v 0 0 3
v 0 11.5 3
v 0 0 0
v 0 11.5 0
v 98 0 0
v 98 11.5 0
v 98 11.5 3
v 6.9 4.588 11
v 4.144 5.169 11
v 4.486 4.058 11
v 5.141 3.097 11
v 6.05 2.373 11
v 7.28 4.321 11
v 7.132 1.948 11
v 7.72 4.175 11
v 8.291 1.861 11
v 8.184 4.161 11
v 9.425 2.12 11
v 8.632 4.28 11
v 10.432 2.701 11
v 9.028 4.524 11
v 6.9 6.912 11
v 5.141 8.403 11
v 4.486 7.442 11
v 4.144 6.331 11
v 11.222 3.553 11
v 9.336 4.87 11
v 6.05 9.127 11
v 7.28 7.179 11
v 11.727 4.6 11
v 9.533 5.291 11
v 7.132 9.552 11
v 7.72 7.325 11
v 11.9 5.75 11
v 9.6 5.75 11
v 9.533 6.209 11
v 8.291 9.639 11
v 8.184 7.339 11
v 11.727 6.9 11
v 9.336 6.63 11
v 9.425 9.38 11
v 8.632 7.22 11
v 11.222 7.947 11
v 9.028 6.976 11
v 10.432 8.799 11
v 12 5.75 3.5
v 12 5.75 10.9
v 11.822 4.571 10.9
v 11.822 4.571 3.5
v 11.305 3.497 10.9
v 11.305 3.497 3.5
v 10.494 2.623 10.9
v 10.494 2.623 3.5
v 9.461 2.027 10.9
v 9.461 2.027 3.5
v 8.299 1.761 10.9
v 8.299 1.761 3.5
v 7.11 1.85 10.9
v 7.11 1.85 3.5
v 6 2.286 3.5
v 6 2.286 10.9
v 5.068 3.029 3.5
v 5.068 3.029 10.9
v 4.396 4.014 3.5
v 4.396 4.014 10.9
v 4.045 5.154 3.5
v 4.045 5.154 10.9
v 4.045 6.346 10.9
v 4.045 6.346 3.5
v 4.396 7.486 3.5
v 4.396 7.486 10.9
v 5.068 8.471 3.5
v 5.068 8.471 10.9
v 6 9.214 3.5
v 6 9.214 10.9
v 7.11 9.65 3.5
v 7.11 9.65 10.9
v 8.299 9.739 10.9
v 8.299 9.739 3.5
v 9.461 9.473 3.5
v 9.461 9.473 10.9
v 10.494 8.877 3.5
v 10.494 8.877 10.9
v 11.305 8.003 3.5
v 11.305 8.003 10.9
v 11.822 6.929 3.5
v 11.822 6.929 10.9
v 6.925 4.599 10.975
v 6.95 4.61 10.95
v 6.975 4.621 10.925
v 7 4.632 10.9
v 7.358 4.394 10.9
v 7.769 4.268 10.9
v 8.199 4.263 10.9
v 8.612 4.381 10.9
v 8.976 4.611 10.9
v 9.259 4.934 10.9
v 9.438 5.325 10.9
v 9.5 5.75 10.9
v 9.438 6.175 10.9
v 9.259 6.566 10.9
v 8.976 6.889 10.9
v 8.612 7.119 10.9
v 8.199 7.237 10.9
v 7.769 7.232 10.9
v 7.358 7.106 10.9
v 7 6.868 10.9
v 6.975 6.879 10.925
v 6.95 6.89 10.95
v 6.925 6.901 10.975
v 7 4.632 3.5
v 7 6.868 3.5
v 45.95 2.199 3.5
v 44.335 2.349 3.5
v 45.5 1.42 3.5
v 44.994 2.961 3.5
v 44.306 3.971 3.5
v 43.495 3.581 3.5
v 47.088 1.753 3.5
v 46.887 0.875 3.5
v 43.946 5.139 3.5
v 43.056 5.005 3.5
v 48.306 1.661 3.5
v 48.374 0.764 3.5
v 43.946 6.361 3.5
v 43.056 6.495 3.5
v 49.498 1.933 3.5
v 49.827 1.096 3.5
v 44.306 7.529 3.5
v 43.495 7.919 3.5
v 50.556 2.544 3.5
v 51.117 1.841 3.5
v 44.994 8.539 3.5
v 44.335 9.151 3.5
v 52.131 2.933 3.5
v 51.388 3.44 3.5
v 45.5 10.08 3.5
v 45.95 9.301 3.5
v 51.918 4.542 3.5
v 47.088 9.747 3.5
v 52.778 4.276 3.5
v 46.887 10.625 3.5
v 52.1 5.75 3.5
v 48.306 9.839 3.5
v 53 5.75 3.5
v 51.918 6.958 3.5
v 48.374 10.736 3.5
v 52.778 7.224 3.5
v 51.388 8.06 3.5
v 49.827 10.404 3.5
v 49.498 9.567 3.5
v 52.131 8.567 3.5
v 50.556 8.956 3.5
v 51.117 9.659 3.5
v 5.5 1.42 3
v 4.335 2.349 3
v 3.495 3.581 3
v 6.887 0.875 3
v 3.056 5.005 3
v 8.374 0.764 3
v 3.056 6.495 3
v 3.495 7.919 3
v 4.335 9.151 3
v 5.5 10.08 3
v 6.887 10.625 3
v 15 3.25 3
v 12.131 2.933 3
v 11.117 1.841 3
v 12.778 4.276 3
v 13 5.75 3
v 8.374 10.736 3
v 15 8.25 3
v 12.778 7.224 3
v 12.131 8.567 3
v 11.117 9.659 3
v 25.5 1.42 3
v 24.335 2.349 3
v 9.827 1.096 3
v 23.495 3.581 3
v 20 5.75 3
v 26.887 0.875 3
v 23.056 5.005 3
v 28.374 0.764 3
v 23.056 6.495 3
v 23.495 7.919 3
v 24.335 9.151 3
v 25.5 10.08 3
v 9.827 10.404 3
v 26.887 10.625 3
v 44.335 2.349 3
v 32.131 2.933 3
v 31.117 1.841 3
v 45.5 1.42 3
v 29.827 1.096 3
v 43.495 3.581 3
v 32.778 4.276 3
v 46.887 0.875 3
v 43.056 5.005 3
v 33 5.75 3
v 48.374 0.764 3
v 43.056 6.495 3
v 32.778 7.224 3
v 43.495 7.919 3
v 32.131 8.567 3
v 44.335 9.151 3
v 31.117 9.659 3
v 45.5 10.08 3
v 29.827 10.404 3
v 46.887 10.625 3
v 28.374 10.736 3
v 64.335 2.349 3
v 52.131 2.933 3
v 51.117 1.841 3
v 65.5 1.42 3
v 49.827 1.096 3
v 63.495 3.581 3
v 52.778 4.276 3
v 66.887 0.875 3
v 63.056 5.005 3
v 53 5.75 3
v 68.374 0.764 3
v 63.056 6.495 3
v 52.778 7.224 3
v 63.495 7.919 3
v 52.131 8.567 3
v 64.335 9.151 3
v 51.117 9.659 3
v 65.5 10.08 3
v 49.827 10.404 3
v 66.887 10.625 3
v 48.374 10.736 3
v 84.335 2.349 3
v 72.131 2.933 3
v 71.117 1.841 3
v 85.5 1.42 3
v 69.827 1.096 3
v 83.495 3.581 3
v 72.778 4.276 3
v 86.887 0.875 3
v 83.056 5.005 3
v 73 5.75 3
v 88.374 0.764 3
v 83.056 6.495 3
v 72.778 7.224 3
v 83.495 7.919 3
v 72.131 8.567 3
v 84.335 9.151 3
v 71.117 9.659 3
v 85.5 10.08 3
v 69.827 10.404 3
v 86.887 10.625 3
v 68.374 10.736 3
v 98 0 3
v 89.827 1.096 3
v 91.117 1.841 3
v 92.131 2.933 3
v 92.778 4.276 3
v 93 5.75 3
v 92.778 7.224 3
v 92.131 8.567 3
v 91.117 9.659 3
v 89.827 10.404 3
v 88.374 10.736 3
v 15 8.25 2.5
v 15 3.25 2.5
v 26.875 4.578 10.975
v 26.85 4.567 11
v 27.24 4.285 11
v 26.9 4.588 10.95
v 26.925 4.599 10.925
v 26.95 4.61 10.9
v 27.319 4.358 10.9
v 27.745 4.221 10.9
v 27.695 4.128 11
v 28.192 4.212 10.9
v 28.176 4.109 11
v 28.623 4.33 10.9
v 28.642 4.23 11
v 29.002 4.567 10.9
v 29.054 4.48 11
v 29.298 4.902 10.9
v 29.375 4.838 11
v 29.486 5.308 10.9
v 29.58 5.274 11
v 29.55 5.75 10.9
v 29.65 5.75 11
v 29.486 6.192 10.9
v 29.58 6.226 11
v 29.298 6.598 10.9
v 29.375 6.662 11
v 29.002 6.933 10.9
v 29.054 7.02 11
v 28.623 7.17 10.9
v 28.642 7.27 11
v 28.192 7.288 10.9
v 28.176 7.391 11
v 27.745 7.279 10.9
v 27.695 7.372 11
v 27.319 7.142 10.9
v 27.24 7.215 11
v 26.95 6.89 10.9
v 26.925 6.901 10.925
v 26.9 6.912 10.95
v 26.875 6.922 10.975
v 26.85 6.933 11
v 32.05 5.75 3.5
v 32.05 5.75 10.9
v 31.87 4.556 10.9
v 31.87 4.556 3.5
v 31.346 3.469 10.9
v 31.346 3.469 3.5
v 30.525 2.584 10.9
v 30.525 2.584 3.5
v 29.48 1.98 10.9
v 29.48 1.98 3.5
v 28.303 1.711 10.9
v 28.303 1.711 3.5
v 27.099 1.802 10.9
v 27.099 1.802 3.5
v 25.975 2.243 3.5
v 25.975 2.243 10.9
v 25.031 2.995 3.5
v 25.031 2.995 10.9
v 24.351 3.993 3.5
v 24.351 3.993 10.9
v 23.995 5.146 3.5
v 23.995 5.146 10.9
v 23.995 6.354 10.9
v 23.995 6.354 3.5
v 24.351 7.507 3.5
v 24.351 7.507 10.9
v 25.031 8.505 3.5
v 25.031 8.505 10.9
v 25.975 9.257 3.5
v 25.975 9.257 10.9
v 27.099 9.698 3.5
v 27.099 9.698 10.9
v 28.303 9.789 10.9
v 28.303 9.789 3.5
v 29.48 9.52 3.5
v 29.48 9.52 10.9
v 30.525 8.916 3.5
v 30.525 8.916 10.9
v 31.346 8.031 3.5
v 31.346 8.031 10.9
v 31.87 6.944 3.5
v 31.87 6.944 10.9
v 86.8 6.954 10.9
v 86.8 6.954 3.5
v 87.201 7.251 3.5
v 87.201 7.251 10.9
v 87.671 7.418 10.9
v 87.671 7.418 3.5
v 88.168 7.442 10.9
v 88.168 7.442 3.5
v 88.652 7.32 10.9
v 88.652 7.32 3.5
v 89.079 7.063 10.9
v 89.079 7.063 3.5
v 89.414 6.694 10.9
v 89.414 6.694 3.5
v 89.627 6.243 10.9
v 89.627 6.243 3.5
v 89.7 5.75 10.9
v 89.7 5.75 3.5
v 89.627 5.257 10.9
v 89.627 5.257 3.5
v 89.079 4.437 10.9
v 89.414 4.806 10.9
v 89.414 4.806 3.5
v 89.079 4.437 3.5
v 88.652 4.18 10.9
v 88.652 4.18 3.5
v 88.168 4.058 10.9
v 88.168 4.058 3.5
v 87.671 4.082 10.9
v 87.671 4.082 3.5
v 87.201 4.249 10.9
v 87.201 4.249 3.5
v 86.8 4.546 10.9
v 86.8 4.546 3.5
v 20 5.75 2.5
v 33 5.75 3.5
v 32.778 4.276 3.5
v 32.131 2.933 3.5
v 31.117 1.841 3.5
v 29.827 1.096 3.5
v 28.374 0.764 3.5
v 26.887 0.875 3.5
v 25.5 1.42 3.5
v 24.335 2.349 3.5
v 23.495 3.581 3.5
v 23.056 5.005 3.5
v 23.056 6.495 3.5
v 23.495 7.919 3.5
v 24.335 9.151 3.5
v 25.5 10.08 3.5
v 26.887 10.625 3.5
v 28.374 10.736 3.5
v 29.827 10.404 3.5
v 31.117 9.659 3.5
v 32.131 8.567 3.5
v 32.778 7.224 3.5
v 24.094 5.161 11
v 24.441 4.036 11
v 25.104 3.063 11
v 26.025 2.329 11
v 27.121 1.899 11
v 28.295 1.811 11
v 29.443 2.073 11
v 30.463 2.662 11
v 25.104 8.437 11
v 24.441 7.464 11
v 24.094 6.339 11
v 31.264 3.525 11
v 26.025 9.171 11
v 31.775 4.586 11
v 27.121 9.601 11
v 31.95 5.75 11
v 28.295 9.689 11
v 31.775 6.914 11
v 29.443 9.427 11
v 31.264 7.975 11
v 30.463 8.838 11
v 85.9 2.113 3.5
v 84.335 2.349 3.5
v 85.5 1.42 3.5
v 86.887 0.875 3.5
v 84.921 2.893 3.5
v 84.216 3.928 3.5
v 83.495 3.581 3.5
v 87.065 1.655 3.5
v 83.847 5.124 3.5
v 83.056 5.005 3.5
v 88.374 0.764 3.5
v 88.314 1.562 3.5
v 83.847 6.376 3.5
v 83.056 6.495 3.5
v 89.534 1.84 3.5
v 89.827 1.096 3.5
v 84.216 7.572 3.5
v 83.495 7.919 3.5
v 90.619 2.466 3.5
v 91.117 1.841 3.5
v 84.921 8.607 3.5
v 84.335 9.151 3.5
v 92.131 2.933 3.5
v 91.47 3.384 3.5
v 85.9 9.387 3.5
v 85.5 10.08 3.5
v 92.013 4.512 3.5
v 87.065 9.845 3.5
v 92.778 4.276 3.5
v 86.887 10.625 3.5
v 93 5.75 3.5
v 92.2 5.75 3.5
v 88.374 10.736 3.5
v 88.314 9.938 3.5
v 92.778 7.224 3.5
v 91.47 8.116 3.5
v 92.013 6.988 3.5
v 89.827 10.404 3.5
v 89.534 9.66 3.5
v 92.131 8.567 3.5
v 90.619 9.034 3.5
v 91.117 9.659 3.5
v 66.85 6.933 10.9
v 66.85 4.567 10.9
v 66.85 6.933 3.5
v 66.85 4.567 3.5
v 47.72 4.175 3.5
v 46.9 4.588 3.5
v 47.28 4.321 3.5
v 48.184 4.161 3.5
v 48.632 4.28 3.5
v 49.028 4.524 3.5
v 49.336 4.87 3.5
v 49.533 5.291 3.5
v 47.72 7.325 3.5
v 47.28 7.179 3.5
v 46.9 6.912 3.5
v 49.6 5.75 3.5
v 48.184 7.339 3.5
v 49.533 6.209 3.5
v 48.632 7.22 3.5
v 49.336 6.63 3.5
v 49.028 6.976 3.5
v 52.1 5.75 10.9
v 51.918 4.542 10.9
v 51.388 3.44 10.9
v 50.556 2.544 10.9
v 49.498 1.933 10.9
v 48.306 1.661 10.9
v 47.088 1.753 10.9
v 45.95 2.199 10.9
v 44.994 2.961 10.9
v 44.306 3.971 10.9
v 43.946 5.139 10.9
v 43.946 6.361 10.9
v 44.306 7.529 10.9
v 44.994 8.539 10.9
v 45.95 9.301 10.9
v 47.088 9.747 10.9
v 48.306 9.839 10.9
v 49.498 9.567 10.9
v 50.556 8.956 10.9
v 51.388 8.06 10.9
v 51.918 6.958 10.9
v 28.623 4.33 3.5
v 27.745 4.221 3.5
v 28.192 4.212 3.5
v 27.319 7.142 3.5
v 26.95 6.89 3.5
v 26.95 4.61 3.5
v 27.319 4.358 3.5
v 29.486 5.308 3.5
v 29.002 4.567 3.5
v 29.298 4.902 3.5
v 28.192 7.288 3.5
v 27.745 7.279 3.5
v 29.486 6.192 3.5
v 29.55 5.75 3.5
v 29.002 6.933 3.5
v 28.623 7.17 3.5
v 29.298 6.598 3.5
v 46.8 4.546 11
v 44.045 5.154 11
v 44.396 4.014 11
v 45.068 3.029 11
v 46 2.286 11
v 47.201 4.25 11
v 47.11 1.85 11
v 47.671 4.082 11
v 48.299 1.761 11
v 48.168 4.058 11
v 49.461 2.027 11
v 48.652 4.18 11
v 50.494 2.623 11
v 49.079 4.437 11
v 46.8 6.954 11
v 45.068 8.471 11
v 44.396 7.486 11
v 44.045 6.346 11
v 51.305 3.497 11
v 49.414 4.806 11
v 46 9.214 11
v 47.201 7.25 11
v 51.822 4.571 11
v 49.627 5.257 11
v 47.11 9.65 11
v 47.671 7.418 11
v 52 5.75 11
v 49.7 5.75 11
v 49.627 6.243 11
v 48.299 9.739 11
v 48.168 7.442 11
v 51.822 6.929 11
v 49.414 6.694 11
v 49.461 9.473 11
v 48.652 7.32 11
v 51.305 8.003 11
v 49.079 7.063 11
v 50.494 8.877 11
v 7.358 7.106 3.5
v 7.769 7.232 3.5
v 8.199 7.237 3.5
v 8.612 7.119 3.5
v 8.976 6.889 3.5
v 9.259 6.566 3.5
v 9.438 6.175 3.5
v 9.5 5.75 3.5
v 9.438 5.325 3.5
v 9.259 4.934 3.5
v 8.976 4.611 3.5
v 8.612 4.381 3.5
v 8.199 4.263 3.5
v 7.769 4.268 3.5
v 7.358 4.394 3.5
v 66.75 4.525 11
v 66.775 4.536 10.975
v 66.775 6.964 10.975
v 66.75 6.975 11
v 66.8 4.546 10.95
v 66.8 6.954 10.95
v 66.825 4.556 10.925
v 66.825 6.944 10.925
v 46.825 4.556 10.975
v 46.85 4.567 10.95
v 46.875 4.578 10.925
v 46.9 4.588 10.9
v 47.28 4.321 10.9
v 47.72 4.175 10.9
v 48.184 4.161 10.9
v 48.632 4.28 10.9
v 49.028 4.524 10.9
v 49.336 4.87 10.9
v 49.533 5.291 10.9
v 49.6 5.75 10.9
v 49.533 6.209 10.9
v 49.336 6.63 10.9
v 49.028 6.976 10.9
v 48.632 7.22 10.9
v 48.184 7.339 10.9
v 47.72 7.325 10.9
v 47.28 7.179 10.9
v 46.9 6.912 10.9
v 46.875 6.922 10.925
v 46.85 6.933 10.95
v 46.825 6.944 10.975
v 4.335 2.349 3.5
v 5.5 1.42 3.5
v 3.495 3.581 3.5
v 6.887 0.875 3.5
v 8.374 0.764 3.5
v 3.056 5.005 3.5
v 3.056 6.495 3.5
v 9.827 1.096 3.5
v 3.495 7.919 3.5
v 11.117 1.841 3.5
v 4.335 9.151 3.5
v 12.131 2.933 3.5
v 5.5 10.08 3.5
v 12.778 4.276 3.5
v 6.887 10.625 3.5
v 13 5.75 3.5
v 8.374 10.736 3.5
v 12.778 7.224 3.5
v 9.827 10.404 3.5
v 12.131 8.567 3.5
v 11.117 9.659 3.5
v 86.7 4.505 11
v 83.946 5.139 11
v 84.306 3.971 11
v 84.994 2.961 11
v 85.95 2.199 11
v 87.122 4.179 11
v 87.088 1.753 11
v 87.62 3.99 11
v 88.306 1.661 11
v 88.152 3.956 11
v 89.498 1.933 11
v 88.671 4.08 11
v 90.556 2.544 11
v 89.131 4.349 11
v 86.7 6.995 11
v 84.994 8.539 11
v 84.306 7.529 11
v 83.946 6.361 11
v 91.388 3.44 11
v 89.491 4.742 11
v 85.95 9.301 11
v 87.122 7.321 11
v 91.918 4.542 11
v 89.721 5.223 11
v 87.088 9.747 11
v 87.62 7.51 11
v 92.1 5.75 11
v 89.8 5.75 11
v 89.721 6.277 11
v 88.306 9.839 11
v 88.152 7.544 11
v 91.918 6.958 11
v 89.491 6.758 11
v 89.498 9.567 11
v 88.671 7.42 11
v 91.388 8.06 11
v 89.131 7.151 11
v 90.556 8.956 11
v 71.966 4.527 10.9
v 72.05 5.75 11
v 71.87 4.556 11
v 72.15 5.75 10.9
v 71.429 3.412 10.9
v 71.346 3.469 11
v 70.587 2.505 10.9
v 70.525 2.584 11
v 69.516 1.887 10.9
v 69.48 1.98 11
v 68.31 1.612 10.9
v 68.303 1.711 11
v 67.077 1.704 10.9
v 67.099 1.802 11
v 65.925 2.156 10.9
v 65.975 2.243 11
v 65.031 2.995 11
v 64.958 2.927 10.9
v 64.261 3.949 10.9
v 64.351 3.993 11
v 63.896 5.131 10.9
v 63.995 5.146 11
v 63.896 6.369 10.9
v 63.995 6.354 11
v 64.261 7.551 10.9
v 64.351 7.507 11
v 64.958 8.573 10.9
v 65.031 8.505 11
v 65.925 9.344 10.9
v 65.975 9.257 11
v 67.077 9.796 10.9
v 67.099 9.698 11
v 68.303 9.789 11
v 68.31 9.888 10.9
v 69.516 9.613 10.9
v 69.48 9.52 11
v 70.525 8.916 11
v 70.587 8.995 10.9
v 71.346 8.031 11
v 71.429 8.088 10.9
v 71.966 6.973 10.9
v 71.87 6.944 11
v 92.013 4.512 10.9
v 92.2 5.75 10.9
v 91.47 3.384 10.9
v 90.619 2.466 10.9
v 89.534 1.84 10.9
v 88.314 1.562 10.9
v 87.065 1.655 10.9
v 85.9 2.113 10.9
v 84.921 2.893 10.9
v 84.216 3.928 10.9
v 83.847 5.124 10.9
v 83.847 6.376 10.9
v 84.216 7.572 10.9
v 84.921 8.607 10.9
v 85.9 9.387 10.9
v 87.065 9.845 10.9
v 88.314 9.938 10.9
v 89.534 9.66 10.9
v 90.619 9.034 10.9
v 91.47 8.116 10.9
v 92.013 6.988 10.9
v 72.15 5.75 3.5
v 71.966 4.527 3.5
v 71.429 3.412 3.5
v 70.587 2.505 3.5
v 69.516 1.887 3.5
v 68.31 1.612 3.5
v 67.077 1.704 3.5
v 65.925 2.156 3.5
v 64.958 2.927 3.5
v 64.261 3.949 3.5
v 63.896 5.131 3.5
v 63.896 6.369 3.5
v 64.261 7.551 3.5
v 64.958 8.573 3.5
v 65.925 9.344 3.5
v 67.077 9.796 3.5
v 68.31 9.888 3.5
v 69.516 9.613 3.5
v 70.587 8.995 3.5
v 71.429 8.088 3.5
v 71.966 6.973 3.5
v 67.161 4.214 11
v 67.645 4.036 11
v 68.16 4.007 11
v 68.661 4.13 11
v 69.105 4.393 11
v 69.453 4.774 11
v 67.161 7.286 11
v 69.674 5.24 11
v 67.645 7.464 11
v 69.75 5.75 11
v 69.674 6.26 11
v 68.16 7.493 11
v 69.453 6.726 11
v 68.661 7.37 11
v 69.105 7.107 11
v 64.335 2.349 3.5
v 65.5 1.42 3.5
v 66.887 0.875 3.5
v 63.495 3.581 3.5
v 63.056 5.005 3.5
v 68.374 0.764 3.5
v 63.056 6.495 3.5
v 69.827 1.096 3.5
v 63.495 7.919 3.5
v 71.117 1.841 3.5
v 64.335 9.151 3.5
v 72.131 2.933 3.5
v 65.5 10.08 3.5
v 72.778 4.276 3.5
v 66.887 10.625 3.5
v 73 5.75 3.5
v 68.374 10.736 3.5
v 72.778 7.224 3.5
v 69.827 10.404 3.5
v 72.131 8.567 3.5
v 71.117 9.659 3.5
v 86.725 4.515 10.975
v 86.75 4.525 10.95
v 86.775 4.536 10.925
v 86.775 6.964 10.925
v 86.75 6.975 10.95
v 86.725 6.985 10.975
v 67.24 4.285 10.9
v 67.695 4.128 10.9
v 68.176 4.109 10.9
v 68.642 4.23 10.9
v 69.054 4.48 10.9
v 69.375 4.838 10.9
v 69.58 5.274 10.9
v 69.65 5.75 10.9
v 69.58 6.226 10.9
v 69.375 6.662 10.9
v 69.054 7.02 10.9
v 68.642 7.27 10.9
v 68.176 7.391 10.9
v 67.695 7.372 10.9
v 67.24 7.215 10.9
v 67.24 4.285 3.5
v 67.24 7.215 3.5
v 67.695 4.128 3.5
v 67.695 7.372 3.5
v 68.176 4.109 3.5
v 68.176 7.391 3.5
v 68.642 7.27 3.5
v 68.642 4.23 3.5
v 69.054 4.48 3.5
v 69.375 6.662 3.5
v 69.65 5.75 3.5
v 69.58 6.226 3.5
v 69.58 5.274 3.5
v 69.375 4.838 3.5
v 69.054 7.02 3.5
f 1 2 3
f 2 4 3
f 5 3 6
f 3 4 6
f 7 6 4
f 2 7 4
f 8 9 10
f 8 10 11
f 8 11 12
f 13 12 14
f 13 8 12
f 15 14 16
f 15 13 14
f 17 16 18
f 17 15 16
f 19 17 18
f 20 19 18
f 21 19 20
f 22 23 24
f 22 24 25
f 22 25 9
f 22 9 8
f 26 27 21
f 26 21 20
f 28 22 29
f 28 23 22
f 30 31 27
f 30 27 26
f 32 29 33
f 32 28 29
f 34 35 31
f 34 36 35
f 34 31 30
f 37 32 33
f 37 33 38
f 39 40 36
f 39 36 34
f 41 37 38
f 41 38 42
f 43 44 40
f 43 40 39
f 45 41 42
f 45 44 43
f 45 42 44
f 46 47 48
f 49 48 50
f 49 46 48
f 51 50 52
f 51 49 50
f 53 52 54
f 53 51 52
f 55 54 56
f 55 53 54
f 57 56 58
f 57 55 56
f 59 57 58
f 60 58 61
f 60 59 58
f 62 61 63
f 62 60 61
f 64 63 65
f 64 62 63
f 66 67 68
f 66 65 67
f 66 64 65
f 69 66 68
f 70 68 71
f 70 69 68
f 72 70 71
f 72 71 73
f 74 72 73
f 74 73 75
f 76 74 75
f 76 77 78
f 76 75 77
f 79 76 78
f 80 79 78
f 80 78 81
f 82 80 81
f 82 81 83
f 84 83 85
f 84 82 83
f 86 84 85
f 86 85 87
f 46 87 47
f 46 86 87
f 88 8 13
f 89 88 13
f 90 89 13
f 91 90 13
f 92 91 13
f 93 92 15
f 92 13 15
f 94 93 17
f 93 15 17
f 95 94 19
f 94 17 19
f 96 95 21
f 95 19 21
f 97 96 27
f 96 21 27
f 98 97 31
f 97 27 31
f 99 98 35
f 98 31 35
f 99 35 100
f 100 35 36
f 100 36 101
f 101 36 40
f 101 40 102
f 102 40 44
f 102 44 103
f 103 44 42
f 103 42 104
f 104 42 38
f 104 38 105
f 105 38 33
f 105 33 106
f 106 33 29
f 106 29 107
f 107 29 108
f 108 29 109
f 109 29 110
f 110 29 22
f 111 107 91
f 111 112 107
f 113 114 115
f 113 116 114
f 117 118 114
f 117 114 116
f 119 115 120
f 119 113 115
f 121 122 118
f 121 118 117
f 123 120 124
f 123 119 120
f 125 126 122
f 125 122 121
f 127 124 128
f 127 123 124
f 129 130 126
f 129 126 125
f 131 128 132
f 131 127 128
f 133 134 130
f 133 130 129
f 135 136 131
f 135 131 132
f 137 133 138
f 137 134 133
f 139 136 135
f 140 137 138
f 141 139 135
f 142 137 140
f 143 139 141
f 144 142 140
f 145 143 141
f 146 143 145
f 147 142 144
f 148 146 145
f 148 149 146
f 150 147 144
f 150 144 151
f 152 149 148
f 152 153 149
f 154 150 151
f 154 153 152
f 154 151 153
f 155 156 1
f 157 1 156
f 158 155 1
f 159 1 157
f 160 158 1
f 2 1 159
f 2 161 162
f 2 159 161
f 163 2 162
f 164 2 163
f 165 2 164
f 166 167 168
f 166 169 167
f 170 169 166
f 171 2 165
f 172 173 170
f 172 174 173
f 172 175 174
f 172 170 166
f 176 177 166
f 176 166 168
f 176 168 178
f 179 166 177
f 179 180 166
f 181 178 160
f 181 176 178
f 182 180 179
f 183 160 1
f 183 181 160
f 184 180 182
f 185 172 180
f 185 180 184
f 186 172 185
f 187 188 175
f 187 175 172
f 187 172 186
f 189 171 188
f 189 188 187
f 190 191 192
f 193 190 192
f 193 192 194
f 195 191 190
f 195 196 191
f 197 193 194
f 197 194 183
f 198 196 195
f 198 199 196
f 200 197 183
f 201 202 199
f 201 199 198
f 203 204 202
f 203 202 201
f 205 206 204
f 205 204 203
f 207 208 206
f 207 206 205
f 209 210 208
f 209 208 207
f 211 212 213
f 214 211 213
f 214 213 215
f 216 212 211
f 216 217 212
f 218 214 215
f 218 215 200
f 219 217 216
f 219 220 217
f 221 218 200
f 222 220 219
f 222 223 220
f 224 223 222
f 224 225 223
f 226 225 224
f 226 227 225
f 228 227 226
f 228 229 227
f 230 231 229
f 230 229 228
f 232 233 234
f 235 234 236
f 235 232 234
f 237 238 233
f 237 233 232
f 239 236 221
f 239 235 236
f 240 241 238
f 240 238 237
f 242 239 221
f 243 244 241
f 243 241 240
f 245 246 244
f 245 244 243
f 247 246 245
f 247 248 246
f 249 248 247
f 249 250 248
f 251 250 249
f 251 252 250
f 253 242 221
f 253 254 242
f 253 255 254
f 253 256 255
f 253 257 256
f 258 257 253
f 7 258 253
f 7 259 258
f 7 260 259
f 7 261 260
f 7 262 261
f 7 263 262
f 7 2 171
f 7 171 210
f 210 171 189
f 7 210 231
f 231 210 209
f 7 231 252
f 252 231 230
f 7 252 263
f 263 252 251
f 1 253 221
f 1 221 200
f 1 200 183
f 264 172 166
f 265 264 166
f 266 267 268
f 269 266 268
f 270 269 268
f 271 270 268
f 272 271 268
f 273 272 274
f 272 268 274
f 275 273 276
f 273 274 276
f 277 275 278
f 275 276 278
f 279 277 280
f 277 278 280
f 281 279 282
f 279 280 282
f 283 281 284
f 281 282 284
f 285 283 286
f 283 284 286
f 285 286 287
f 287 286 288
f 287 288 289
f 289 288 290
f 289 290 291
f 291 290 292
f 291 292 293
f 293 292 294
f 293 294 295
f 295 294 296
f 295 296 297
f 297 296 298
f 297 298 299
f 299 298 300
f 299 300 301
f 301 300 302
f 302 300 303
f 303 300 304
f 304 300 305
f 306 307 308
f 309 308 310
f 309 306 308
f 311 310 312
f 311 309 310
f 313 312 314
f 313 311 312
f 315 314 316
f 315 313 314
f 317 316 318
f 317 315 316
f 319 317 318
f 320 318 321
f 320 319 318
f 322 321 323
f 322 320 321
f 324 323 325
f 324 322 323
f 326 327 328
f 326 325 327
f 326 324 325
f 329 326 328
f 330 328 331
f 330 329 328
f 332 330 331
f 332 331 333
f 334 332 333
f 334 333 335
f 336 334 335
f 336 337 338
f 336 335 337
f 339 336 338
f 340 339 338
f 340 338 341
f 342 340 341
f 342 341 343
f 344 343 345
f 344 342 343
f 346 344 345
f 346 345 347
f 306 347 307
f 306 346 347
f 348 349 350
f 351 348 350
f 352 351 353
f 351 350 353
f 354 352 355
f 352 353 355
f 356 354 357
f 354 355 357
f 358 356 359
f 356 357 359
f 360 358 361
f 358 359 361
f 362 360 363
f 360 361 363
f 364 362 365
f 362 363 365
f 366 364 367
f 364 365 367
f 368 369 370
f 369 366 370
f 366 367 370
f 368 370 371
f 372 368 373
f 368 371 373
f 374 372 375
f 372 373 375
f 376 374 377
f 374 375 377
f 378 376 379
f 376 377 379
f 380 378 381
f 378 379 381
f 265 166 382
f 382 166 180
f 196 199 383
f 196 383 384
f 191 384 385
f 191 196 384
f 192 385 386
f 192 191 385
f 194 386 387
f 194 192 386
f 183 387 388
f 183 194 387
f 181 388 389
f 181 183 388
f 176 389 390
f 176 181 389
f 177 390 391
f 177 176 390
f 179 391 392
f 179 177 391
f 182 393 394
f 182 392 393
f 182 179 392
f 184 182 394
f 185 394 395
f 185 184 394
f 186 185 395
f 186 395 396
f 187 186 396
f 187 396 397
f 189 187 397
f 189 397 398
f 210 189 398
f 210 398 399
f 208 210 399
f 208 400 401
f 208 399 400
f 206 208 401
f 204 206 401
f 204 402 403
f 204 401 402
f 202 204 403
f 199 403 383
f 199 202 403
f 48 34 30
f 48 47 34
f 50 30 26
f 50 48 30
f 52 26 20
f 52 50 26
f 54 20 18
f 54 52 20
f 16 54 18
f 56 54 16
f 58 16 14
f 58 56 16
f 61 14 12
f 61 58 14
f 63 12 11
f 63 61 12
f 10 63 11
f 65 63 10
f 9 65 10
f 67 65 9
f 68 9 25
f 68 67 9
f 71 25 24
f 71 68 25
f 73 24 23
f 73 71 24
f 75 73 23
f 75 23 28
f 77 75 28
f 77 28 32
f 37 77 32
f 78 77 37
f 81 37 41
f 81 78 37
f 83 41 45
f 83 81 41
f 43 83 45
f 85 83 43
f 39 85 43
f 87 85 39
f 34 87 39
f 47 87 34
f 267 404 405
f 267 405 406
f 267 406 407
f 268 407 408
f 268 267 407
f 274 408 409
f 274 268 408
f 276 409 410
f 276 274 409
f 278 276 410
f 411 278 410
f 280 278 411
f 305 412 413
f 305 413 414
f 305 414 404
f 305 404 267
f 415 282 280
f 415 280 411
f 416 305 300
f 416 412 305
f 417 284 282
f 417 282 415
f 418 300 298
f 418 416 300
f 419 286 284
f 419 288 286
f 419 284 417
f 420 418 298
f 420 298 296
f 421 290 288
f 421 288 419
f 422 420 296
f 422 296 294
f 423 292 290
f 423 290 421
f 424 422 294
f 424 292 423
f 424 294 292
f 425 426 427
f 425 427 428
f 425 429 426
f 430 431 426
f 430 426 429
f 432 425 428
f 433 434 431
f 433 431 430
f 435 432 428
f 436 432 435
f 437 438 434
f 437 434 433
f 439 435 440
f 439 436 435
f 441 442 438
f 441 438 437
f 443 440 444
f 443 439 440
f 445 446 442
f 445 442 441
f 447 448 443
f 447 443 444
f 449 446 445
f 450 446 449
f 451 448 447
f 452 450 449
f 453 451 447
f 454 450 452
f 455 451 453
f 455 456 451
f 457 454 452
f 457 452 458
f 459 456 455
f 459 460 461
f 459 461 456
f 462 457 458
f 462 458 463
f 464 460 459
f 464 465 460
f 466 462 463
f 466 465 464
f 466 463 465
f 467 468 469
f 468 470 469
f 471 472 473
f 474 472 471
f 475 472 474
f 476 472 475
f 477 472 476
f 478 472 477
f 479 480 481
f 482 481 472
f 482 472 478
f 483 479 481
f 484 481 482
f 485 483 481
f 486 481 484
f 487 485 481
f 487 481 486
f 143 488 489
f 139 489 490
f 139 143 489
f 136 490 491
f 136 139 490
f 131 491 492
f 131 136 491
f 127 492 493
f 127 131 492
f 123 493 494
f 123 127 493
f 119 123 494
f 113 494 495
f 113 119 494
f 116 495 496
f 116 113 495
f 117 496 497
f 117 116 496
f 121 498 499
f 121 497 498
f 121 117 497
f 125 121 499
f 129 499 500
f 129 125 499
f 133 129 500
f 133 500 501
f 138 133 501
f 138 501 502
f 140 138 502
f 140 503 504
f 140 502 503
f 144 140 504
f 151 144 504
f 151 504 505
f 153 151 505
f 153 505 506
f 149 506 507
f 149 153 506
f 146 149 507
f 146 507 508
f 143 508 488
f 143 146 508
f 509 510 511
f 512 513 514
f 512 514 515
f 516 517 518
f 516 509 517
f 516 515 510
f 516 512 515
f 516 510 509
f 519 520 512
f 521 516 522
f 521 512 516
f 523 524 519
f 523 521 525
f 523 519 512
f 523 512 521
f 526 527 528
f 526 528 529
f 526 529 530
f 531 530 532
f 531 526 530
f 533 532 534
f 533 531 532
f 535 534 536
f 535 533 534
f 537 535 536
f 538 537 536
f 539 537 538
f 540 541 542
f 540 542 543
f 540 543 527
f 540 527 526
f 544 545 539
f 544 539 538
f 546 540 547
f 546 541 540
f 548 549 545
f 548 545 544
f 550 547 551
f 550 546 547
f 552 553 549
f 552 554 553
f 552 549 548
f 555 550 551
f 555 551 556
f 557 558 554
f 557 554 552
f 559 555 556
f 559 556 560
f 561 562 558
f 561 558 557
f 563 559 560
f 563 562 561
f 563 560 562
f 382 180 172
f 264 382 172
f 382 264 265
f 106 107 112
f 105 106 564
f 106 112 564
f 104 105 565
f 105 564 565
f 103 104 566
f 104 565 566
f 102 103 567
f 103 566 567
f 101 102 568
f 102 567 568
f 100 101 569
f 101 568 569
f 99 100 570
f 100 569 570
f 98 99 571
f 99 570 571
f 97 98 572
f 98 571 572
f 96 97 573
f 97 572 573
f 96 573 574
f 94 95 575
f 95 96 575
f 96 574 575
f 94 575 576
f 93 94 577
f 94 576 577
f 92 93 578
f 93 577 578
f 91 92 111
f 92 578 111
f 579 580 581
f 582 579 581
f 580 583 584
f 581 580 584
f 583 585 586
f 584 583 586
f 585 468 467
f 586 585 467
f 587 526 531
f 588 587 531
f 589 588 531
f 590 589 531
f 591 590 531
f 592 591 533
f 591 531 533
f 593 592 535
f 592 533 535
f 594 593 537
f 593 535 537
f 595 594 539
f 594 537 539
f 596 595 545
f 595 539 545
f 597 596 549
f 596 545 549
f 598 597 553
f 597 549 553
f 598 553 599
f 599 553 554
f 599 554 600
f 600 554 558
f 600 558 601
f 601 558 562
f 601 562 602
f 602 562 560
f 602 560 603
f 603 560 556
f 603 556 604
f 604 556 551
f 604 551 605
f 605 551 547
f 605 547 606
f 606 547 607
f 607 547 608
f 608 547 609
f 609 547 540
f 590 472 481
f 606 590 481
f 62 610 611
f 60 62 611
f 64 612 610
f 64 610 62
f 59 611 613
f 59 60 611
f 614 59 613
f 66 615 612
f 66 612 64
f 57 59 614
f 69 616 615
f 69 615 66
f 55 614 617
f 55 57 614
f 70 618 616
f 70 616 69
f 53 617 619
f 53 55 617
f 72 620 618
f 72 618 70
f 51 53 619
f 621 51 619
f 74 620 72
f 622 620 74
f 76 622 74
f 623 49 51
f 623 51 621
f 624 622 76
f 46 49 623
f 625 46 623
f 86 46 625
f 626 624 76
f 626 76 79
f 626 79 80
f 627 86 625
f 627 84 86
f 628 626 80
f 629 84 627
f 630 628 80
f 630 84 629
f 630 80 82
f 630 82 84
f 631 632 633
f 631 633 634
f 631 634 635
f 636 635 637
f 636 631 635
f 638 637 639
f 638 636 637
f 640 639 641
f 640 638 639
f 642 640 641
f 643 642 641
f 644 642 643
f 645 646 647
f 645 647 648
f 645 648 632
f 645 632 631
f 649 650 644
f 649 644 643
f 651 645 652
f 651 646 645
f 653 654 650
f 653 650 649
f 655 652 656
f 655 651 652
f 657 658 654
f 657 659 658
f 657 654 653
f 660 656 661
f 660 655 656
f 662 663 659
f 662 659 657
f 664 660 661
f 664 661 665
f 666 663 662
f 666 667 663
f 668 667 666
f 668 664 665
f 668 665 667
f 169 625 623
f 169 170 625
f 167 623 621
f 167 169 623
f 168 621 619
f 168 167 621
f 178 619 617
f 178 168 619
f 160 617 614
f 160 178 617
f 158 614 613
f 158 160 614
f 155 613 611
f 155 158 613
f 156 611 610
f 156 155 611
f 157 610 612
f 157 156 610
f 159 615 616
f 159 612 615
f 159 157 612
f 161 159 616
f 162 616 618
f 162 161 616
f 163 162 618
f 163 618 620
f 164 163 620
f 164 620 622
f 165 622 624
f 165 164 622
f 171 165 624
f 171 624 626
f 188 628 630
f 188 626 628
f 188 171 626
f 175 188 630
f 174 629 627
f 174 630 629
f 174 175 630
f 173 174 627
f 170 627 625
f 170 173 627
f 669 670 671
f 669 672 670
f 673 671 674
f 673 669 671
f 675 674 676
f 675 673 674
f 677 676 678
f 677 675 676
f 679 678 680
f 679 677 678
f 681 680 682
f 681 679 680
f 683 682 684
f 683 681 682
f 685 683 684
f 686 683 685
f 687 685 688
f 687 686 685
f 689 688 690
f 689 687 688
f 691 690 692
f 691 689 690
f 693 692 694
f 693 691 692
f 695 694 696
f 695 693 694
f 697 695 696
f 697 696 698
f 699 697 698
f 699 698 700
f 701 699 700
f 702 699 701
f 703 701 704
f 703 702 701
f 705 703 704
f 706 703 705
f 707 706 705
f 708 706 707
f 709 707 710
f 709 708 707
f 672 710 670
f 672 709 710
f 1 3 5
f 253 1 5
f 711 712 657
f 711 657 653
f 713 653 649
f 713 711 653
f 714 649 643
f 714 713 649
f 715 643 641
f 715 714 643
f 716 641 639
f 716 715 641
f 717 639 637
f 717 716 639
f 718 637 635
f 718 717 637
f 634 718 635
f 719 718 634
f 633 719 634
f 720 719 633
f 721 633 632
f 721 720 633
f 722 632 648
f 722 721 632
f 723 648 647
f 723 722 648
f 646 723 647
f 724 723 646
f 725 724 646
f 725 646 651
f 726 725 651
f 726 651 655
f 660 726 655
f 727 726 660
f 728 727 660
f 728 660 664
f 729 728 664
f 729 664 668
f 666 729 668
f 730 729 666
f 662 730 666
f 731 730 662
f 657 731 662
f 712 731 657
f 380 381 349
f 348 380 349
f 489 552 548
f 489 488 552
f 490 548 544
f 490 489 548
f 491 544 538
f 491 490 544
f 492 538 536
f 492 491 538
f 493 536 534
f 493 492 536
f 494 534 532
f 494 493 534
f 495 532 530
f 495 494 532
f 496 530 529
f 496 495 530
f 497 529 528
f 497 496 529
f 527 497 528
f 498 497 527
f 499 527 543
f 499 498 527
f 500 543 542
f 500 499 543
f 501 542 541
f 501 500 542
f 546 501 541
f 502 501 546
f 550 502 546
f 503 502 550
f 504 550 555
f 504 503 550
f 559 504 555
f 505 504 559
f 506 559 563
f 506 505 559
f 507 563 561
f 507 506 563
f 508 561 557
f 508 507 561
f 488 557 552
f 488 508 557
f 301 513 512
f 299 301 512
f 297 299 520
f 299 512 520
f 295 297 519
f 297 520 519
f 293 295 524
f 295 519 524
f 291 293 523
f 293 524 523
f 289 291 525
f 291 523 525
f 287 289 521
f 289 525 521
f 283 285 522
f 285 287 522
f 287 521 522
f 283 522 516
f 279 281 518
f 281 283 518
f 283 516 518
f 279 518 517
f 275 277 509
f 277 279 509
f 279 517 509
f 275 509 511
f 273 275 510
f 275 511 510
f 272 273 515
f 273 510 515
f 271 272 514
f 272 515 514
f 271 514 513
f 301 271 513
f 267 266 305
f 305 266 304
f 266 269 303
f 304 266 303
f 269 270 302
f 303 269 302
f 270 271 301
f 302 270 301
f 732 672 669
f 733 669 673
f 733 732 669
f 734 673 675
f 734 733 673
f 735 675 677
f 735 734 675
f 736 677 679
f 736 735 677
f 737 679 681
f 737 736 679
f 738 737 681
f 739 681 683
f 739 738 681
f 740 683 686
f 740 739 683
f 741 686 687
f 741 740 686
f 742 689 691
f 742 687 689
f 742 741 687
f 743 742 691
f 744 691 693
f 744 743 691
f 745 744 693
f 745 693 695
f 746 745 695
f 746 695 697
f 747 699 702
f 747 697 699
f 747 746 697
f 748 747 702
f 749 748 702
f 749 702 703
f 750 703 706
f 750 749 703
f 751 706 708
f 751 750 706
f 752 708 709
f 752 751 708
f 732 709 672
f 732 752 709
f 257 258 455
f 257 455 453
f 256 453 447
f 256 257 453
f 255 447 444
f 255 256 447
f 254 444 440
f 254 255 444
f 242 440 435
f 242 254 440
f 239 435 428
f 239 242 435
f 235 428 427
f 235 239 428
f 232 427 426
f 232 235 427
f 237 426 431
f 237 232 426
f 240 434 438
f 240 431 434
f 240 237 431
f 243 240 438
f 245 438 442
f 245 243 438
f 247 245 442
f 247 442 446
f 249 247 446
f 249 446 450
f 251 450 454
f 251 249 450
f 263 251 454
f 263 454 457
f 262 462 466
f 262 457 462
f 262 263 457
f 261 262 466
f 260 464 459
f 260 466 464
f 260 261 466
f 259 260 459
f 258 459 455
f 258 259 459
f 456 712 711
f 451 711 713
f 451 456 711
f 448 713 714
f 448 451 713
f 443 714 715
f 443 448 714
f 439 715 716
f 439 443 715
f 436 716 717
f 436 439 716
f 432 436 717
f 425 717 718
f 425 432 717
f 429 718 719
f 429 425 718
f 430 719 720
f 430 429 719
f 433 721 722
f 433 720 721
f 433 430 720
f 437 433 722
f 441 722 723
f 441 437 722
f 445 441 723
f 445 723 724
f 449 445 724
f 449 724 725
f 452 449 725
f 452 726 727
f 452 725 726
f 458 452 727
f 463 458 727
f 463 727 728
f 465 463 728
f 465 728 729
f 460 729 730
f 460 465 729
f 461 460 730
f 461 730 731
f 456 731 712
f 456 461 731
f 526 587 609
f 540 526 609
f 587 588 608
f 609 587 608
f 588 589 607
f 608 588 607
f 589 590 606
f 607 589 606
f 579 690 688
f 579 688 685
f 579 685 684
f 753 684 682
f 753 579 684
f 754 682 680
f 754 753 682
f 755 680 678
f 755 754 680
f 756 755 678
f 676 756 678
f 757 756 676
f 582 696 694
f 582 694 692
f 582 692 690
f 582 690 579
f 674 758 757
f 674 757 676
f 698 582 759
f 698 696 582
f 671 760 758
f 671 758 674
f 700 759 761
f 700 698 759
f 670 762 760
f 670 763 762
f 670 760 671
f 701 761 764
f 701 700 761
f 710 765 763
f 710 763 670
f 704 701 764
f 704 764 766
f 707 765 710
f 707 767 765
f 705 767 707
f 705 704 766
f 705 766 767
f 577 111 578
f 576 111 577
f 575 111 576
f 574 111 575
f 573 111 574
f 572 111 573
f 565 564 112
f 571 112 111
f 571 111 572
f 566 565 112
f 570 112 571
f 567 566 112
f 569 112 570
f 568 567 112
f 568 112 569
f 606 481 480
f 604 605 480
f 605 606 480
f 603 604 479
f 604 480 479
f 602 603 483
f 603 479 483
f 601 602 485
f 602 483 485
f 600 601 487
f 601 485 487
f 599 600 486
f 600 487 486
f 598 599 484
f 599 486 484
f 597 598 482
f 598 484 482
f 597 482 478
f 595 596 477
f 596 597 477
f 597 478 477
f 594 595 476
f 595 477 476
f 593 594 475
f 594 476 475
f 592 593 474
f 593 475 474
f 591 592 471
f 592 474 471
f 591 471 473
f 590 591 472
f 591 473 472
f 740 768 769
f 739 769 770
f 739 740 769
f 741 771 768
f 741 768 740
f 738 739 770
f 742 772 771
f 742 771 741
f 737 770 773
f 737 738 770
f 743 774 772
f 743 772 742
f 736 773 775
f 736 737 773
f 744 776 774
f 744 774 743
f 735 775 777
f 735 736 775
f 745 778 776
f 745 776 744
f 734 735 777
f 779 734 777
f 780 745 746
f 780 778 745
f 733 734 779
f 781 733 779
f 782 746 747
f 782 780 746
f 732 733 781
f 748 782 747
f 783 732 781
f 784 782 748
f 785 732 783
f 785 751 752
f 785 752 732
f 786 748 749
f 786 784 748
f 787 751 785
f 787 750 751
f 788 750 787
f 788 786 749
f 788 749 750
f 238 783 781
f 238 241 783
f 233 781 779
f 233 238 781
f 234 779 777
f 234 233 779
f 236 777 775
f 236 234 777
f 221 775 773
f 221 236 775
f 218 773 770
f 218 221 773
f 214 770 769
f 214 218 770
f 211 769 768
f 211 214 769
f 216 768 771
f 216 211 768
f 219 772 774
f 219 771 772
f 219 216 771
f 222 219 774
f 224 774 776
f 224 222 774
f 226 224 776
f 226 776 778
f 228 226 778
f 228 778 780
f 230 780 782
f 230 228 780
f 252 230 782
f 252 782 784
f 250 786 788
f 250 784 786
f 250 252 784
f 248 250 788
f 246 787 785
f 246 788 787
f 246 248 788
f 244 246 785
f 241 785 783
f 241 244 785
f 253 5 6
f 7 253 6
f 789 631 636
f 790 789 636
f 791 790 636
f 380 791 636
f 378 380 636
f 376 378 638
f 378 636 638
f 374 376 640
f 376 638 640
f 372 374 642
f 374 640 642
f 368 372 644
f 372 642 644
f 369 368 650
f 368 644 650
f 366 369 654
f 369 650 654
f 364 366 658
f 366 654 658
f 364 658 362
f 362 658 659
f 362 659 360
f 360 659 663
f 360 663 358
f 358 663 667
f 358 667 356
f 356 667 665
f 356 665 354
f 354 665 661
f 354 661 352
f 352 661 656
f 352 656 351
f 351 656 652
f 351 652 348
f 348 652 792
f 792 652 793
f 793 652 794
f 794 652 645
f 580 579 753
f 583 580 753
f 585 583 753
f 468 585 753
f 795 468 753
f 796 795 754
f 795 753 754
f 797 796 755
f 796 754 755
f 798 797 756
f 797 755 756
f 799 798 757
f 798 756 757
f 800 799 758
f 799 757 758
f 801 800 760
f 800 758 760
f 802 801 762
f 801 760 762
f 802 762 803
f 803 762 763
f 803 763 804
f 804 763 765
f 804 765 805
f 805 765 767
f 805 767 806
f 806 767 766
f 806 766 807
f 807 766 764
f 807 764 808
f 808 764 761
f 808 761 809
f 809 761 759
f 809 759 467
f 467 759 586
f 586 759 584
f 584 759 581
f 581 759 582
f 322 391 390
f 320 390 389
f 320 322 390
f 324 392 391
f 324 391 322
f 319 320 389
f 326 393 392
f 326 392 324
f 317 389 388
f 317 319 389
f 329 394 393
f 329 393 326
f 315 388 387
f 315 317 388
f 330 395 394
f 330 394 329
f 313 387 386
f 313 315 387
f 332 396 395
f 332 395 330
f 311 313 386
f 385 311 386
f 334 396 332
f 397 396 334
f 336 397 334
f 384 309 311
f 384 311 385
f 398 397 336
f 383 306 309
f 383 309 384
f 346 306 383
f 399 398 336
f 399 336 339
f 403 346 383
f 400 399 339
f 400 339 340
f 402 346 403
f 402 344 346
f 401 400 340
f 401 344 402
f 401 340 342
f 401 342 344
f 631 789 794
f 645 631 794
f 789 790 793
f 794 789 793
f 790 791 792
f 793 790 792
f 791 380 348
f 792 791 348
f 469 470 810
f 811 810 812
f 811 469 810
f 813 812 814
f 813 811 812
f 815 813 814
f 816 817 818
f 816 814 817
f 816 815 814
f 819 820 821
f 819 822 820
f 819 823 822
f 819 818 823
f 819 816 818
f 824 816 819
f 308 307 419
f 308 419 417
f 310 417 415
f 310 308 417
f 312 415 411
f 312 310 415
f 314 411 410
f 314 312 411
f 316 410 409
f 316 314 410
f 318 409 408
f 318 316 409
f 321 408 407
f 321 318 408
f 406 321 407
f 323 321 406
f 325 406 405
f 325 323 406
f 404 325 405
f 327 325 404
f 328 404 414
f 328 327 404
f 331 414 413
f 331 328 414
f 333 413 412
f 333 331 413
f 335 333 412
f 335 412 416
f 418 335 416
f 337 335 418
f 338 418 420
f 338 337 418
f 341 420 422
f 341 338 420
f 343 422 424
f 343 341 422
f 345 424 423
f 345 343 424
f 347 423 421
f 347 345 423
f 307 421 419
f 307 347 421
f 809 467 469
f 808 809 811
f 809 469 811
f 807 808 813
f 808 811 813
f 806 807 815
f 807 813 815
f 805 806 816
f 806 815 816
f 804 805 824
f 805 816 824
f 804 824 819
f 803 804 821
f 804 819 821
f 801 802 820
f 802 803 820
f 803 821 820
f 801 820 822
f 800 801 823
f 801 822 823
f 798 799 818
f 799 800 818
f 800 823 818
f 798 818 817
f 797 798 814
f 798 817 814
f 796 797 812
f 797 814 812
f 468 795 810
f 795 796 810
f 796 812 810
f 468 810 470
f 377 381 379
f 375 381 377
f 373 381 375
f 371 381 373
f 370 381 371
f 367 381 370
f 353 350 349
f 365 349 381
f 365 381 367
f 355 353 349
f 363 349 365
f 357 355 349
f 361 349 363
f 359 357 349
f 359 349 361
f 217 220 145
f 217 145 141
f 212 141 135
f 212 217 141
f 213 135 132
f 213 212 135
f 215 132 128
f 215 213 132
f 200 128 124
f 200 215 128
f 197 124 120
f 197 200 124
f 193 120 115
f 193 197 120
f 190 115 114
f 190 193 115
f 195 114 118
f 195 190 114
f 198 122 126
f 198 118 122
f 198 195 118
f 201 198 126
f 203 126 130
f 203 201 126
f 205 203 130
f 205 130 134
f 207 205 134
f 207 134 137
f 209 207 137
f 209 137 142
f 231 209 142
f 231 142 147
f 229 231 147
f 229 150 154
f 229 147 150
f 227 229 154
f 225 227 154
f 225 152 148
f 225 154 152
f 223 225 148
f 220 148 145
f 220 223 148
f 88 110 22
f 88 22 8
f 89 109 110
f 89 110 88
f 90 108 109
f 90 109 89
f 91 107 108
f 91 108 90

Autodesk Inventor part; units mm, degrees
ref_plane "YZ Plane" through (0, 0, 0) normal (1, 0, 0) x (0, 1, 0)
ref_plane "XZ Plane" through (0, 0, 0) normal (0, 1, 0) x (-1, 0, 0)
sketch "Sketch1" plane through (0, 0, 0) normal (0, 0, 1) x (1, 0, 0)
  line L0 (0, 0) -> (98, 0)
  line L1 (98, 0) -> (98, 11.5)
  line L2 (98, 11.5) -> (0, 11.5)
  line L3 (0, 11.5) -> (0, 0)
  circle A0 centre (8, 5.75) radius 4
  arc A1 (7, 4.632) -> (7, 6.868) centre (8, 5.75) ccw
  line L4 (7, 6.868) -> (7, 4.632)
  circle A2 centre (28, 5.75) radius 4
  arc A3 (27, 4.632) -> (27, 6.868) centre (28, 5.75) ccw
  line L5 (27, 6.868) -> (27, 4.632)
  circle A4 centre (48, 5.75) radius 4
  arc A5 (47, 4.632) -> (47, 6.868) centre (48, 5.75) ccw
  line L6 (47, 6.868) -> (47, 4.632)
  circle A6 centre (68, 5.75) radius 4
  arc A7 (67, 4.632) -> (67, 6.868) centre (68, 5.75) ccw
  line L7 (67, 6.868) -> (67, 4.632)
  circle A8 centre (88, 5.75) radius 4
  arc A9 (87, 4.632) -> (87, 6.868) centre (88, 5.75) ccw
  line L8 (87, 6.868) -> (87, 4.632)
  point P0 (0, 5.75)
  dimension "d0" = 11.5
  dimension "d1" = 8
  dimension "d2" = 8
  dimension "d3" = 1.5
  dimension "d4" = 1
  dimension "d7" = 20
  dimension "d12" = 98
extrude "Extrusion1" add sketch "Sketch1" along normal blind 3 contours L3 L2 L1 L0 | A0 | L4 A1 | A2 | L5 A3 | A4 | L6 A5 | A6 | L7 A7 | A8 | L8 A9
sketch "Sketch2" plane through (0, 0, 3) normal (0, 0, 1) x (1, 0, 0)
  circle A0 centre (8, 5.75) radius 4 projected
  arc A1 (7, 4.632) -> (7, 6.868) centre (8, 5.75) ccw projected
  line L0 (7, 6.868) -> (7, 4.632) projected
  circle A2 centre (28, 5.75) radius 4 construction
  arc A3 (27, 4.632) -> (27, 6.868) centre (28, 5.75) ccw construction
  line L1 (27, 6.868) -> (27, 4.632) construction
  line L2 (47, 6.868) -> (47, 4.632) construction
  arc A4 (47, 4.632) -> (47, 6.868) centre (48, 5.75) ccw construction
  circle A5 centre (48, 5.75) radius 4 construction
  circle A6 centre (68, 5.75) radius 4 construction
  arc A7 (67, 4.632) -> (67, 6.868) centre (68, 5.75) ccw construction
  line L3 (67, 6.868) -> (67, 4.632) construction
  line L4 (87, 6.868) -> (87, 4.632) construction
  arc A8 (87, 4.632) -> (87, 6.868) centre (88, 5.75) ccw construction
  circle A9 centre (88, 5.75) radius 4 construction
  circle A10 centre (28, 5.75) radius 4.05
  arc A11 (26.95, 4.6098) -> (26.95, 6.8902) centre (28, 5.75) ccw
  line L5 (26.95, 4.6098) -> (26.95, 6.8902)
  circle A12 centre (48, 5.75) radius 4.1
  line L6 (46.9, 4.5881) -> (46.9, 6.9119)
  arc A13 (46.9, 4.5881) -> (46.9, 6.9119) centre (48, 5.75) ccw
  circle A14 centre (68, 5.75) radius 4.15
  arc A15 (66.85, 4.5668) -> (66.85, 6.9332) centre (68, 5.75) ccw
  line L7 (66.85, 4.5668) -> (66.85, 6.9332)
  line L8 (86.8, 4.5458) -> (86.8, 6.9542)
  arc A16 (86.8, 4.5458) -> (86.8, 6.9542) centre (88, 5.75) ccw
  circle A17 centre (88, 5.75) radius 4.2
  point P0 (0, 0)
  dimension "d15" = 0.05
  dimension "d17" = 0.05
  dimension "d18" = 0.1
  dimension "d19" = 0.1
  dimension "d20" = 0.15
  dimension "d21" = 0.15
  dimension "d22" = 0.2
  dimension "d23" = 0.2
extrude "Extrusion2" add sketch "Sketch2" along normal blind 8
sketch "Sketch3" plane through (0, 0, 3) normal (0, 0, 1) x (1, 0, 0)
  circle A0 centre (8, 5.75) radius 4 projected
  circle A1 centre (8, 5.75) radius 5
  line L0 (0, 0) -> (98, 0) projected
  circle A2 centre (28, 5.75) radius 5
  circle A3 centre (48, 5.75) radius 5
  circle A4 centre (68, 5.75) radius 5
  circle A5 centre (88, 5.75) radius 5
  dimension "d26" = 1
  dimension "d29" = 20
extrude "Extrusion3" add sketch "Sketch3" along normal blind 0.5 contours A0 | A1 | A2 | A3 | A4 | A5
chamfer "Chamfer1" distance 0.1 angle 45 15 edges at (4, 5.75, 11) (9.5, 5.75, 11) (7, 5.75, 11) (23.95, 5.75, 11) (29.55, 5.75, 11) (26.95, 5.75, 11) (43.9, 5.75, 11) (49.6, 5.75, 11) (46.9, 5.75, 11) (69.65, 5.75, 11) (66.85, 5.75, 11) (63.85, 5.75, 11) (83.8, 5.75, 11) (89.7, 5.75, 11) (86.8, 5.75, 11)
sketch "Sketch4" plane through (0, 0, 3) normal (0, 0, 1) x (1, 0, 0)
  line L0 (15, 8.25) -> (15, 3.25)
  line L1 (15, 3.25) -> (20, 5.75)
  line L2 (20, 5.75) -> (15, 8.25)
  line L3 (0, 11.5) -> (0, 0) projected
  line L4 (0, 5.75) -> (37.8806, 5.75)
  dimension "d39" = 15
  dimension "d40" = 5
  dimension "d41" = 5
extrude "Extrusion4" cut sketch "Sketch4" against normal blind 0.5
properties part number "insert_testing_3Dprint"
